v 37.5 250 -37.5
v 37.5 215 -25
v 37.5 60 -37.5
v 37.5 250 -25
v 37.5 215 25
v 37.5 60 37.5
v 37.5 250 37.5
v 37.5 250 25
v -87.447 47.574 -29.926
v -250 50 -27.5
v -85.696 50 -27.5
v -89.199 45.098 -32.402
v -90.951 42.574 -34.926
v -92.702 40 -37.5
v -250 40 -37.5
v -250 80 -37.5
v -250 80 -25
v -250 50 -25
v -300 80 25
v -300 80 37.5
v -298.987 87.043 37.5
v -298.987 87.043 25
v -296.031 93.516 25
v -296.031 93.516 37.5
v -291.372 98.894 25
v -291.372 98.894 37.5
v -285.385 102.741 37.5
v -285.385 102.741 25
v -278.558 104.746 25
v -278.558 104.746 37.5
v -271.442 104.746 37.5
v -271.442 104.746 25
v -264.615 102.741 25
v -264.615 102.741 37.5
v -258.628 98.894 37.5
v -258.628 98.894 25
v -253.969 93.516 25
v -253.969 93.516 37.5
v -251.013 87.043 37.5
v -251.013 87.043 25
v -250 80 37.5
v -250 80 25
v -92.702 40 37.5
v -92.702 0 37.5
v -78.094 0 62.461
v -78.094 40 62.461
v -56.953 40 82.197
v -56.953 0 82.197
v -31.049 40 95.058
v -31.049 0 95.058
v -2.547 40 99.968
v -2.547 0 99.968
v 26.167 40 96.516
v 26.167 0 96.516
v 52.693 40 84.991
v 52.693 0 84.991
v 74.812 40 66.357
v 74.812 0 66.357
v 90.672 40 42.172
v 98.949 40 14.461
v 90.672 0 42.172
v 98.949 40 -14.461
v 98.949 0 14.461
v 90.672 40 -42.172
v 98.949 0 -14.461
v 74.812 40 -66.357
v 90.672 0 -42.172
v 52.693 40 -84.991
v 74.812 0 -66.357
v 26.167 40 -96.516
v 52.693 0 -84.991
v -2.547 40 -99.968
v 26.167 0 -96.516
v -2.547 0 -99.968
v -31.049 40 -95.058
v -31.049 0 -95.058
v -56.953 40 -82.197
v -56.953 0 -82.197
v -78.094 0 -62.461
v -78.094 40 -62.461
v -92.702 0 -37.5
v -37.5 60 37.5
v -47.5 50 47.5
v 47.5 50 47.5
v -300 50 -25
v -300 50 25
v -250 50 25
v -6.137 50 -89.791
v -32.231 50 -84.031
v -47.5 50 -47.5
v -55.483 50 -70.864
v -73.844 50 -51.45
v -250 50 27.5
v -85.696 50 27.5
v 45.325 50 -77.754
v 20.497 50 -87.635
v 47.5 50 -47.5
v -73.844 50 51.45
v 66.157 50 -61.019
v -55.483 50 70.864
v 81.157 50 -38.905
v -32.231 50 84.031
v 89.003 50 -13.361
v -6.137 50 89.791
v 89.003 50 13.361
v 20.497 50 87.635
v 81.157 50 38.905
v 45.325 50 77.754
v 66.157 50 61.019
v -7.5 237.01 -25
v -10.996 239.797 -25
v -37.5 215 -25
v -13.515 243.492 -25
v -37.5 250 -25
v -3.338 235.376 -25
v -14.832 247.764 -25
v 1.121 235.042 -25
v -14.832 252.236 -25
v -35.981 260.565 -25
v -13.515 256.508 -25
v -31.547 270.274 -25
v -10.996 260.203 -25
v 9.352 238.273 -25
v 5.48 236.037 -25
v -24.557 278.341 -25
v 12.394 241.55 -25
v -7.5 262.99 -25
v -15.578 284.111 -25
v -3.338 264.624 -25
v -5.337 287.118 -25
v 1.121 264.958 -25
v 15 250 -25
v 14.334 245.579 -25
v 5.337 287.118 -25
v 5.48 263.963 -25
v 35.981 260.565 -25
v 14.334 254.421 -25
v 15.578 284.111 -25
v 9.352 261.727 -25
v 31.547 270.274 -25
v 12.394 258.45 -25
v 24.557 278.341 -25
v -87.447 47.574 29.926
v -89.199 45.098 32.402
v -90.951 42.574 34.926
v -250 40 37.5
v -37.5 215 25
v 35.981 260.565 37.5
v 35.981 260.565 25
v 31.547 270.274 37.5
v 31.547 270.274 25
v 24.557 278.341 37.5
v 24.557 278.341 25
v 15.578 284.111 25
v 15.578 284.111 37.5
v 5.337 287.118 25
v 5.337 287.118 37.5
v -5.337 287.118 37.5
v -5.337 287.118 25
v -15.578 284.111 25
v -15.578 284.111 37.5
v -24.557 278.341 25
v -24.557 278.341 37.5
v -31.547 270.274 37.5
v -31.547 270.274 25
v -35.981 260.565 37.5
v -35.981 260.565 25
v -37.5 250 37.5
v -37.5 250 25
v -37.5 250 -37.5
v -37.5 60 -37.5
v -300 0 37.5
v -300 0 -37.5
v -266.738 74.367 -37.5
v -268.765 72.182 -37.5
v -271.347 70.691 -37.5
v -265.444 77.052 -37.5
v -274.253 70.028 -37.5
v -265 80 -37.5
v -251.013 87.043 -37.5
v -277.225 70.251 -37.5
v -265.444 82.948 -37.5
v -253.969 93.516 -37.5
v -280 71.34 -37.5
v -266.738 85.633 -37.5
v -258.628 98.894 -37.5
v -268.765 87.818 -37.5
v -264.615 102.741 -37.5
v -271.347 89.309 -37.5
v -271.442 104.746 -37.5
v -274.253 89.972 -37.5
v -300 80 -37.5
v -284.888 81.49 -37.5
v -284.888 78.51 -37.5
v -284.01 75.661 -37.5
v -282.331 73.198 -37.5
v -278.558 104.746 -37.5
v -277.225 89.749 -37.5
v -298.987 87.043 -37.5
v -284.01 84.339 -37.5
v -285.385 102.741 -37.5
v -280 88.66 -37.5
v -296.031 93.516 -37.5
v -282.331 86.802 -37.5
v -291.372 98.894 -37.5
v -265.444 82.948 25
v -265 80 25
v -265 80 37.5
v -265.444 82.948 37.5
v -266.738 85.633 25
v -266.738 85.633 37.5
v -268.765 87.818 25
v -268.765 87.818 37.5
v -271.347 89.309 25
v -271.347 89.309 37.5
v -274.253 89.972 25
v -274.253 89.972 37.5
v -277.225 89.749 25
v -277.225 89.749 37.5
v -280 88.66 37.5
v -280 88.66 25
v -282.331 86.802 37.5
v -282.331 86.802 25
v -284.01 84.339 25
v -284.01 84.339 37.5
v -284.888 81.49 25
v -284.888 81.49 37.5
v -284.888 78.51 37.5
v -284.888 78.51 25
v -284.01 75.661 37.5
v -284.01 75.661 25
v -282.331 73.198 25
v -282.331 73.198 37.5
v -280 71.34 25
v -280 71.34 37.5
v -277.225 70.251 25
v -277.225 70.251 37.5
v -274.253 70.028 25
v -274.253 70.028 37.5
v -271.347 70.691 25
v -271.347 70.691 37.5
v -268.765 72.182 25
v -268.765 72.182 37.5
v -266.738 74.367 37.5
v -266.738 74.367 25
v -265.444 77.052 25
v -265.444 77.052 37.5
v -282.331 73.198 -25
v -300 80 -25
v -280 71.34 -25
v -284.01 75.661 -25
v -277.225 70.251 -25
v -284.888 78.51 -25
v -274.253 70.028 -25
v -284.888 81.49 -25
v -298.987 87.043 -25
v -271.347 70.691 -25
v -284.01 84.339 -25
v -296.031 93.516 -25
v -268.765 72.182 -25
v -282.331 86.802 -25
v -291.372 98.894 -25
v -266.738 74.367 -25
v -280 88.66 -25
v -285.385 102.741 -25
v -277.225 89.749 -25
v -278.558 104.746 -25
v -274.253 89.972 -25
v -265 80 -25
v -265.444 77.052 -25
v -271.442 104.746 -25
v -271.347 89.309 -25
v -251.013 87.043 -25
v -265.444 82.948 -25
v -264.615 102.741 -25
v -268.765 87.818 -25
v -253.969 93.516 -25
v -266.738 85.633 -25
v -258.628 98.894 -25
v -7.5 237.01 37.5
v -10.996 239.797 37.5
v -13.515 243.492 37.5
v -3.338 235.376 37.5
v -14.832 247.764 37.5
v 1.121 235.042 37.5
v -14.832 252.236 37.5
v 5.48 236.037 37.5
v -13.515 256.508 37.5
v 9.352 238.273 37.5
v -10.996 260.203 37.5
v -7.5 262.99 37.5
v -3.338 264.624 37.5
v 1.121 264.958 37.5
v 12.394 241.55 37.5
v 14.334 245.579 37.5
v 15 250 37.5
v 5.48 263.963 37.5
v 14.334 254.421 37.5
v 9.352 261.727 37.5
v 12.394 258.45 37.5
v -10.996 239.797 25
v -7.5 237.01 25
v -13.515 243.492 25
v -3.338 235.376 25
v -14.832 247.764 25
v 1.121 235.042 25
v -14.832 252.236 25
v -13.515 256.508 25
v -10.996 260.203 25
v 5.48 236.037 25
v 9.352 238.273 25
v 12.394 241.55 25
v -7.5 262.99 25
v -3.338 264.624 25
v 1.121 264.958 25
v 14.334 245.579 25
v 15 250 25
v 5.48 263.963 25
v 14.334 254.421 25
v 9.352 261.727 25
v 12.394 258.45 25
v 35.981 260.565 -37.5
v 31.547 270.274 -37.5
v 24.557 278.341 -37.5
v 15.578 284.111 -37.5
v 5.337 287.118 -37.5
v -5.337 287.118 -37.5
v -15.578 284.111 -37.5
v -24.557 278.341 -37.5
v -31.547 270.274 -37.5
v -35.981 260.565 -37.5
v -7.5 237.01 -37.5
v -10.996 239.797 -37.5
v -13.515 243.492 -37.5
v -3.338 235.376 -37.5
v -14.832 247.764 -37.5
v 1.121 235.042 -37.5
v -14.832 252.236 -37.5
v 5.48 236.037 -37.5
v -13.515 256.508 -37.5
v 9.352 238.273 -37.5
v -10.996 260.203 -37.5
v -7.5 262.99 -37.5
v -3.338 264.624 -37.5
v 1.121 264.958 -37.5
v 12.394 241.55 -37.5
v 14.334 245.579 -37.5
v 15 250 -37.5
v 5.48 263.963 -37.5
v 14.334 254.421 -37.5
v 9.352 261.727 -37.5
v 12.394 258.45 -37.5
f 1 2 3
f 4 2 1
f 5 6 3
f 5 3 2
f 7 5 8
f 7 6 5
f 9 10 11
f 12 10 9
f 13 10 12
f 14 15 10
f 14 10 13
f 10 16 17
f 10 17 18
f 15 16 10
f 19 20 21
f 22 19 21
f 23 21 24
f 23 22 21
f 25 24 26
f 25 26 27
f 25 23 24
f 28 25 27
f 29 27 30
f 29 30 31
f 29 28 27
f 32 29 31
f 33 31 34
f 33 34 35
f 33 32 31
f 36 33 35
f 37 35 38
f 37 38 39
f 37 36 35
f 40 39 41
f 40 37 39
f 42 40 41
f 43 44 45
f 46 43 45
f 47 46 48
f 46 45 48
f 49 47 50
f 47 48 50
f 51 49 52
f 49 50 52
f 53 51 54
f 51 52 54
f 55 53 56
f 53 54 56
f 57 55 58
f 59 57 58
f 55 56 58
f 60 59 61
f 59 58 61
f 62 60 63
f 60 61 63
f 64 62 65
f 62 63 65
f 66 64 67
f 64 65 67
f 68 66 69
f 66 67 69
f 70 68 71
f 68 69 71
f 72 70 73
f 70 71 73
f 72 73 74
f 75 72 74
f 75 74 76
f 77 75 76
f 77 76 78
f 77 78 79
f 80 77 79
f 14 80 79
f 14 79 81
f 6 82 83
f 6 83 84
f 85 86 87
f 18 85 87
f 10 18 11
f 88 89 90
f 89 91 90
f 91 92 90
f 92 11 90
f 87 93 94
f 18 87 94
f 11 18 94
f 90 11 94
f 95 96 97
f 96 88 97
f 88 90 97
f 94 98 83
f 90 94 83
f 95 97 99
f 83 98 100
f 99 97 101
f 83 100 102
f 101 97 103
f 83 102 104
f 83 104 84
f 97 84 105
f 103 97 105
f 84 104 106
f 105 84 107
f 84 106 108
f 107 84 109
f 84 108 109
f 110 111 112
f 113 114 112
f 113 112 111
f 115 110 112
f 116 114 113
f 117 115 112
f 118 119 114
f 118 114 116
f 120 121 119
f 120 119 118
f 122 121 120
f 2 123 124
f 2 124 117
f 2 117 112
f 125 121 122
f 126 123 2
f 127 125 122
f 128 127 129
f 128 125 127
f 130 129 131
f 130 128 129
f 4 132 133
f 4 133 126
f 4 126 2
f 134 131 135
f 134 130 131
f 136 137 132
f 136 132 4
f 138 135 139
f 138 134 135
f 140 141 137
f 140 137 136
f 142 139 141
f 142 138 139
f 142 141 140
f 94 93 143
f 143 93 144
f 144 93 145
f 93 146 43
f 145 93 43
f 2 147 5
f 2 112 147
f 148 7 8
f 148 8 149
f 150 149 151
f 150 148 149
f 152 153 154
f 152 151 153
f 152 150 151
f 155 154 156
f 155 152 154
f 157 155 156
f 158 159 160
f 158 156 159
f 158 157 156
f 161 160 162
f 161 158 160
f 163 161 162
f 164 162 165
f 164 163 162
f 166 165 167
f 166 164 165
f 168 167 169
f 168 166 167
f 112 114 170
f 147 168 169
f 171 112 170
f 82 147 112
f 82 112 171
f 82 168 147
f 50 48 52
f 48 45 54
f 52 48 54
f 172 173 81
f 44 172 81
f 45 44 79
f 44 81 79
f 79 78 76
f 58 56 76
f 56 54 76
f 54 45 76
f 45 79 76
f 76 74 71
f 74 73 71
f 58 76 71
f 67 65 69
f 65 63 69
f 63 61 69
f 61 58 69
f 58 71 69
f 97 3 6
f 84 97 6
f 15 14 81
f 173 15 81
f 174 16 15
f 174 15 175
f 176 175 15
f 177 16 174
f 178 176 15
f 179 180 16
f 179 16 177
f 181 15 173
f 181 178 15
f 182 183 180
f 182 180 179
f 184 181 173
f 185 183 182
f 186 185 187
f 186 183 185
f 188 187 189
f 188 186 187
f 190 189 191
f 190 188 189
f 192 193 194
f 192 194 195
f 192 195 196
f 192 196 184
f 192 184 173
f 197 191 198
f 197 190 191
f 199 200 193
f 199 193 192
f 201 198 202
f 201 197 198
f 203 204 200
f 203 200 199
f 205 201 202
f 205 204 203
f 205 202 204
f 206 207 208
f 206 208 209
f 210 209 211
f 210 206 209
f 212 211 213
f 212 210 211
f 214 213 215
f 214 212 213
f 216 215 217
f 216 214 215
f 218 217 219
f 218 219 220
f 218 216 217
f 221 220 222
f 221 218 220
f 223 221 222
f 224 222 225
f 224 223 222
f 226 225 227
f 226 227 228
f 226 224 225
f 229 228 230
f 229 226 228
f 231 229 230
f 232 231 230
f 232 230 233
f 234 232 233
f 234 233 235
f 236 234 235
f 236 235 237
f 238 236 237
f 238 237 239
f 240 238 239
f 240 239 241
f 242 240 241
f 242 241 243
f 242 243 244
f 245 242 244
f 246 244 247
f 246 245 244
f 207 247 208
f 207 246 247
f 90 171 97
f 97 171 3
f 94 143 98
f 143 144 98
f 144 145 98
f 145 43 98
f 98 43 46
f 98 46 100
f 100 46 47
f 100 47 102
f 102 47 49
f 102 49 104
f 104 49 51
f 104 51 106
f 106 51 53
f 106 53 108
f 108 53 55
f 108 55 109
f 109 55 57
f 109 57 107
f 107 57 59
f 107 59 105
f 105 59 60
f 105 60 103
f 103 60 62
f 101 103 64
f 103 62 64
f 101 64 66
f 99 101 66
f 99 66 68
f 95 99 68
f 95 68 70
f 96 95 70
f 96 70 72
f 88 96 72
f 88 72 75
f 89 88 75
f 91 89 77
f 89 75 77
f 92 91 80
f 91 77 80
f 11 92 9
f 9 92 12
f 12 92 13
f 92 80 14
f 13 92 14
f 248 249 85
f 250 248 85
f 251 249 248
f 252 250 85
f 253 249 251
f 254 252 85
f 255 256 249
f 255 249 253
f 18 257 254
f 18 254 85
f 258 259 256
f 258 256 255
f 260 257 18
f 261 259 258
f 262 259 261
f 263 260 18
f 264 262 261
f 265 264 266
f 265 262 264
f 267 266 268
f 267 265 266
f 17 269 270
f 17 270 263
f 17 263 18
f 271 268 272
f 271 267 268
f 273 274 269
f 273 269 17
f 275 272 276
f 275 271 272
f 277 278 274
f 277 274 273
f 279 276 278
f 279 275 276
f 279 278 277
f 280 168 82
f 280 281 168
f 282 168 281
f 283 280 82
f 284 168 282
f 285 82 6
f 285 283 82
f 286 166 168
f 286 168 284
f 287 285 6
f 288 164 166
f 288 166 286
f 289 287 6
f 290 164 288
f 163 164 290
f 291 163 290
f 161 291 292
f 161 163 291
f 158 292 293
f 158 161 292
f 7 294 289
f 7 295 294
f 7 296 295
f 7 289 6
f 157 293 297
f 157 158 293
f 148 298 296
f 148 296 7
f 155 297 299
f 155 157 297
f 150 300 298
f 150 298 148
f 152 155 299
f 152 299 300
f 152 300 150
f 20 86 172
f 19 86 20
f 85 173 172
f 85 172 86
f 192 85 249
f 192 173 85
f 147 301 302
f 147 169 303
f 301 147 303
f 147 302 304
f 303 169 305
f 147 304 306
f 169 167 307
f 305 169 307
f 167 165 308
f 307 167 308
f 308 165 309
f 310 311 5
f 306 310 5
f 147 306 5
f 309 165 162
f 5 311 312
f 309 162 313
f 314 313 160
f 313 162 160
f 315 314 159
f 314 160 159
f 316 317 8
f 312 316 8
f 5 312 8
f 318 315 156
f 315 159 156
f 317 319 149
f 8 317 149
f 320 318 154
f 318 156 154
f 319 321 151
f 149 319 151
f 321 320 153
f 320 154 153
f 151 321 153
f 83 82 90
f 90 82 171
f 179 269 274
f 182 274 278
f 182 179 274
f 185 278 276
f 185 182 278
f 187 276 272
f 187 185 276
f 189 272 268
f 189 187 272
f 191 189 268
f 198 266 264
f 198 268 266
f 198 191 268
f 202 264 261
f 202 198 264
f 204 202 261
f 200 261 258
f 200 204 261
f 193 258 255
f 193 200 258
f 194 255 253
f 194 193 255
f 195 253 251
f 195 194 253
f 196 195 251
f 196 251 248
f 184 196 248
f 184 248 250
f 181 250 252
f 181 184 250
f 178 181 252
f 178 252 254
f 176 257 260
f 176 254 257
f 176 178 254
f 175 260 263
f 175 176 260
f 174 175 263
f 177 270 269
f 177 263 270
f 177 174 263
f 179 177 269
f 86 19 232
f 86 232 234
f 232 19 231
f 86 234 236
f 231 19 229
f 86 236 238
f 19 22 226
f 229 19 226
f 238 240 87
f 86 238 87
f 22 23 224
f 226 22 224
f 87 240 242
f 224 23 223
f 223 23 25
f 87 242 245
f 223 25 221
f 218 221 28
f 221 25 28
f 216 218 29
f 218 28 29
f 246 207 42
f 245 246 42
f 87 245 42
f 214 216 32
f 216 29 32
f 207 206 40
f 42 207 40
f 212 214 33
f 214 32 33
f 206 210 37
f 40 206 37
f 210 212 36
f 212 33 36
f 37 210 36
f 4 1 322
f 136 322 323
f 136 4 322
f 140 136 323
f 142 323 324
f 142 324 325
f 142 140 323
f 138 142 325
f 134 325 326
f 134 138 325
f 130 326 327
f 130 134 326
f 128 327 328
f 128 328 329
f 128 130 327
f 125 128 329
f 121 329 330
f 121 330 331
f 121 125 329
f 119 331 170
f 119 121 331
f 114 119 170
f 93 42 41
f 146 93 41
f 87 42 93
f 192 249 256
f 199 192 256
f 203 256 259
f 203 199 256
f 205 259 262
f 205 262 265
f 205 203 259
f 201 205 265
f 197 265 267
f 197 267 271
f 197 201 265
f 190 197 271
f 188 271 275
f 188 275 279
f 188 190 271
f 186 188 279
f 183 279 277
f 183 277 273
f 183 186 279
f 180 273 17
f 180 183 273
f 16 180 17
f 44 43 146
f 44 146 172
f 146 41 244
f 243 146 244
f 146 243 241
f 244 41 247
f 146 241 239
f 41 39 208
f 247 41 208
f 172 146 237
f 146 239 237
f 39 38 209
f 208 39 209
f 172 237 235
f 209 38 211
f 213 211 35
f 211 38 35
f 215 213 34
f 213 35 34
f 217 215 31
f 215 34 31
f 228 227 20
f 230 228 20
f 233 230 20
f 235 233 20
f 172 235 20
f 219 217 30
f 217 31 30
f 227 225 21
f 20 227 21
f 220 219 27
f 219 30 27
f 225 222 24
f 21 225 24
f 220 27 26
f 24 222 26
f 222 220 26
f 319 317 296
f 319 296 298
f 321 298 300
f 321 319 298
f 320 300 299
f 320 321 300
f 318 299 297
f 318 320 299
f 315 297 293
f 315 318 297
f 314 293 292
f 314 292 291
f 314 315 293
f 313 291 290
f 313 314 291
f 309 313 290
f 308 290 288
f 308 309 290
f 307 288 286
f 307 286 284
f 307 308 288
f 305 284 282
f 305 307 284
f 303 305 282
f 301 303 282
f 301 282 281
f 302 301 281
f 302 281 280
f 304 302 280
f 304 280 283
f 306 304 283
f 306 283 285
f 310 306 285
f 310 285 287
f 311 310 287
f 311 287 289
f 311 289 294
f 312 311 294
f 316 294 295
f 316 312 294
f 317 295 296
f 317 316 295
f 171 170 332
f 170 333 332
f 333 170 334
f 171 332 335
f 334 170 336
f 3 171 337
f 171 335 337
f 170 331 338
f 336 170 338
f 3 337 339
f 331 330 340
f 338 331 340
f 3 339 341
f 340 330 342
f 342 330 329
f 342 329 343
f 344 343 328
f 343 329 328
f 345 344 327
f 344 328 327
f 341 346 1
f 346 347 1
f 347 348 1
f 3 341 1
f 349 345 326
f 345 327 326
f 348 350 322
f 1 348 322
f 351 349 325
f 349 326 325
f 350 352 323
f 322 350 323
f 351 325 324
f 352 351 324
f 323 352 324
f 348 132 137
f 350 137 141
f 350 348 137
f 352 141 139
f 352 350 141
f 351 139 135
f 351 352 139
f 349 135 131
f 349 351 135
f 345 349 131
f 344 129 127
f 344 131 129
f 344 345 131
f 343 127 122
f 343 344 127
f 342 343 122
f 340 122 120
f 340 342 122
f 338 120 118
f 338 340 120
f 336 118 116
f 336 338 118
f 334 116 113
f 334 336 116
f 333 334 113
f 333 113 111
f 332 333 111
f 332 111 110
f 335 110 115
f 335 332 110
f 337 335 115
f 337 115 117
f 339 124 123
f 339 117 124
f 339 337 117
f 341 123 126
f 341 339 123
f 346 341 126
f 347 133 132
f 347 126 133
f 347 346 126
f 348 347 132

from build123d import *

# Parameters (mm, degrees)
SKETCH1_R           = 100
BOSS_EXTRUDE1_DEPTH = 50
SKETCH2_W           = 300
SKETCH2_H           = 75
BOSS_EXTRUDE2_DEPTH = 50
SKETCH3_R           = 10
SKETCH3_R_2         = 15
BOSS_EXTRUDE3_DEPTH = 37.5
SKETCH4_W           = 75
SKETCH4_H           = 72.5
SKETCH4_W_2         = 50
SKETCH4_H_2         = 55
CUT_EXTRUDE2_DEPTH  = 25
CHAMFER1_SIZE       = 10
CHAMFER2_SIZE       = 10


with BuildPart() as part:
    # Sketch1 → Boss-Extrude1 (new body)
    with BuildSketch(Plane(origin=(0, 0, 0), x_dir=(1, 0, 0), z_dir=(0, 1, 0))):
        with Locations(Location((0, 0, 0), (0, 0, 270))):
            Circle(SKETCH1_R)
    extrude(amount=BOSS_EXTRUDE1_DEPTH)

    # Sketch2 → Boss-Extrude2 (add)
    with BuildSketch(Plane(origin=(0, 50, 0), x_dir=(1, 0, 0), z_dir=(0, 1, 0))):
        with Locations((-150, 0)):
            Rectangle(SKETCH2_W, SKETCH2_H)
    extrude(amount=-BOSS_EXTRUDE2_DEPTH)

    # Sketch3 → Boss-Extrude3 (add, symmetric)
    # profile 1 of 2: a face of its own
    with BuildSketch(Plane.XY):
        with BuildLine():
            Line((-300, 50), (-300, 80))
            ThreePointArc((-300, 80), (-275, 105), (-250, 80))
            Line((-250, 80), (-250, 50))
            Line((-250, 50), (-300, 50))
        make_face()
        with Locations((-275, 80)):
            Circle(SKETCH3_R, mode=Mode.SUBTRACT)
    # profile 2 of 2: a face of its own
    with BuildSketch(Plane.XY):
        with BuildLine():
            Line((-37.5, 50), (37.5, 50))
            Line((37.5, 50), (37.5, 250))
            ThreePointArc((37.5, 250), (0, 287.5), (-37.5, 250))
            Line((-37.5, 250), (-37.5, 50))
        make_face()
        with Locations((0, 250)):
            Circle(SKETCH3_R_2, mode=Mode.SUBTRACT)
    extrude(amount=BOSS_EXTRUDE3_DEPTH, both=True)

    # Sketch4 → Cut-Extrude2 (cut, symmetric)
    with BuildSketch(Plane.XY):
        with Locations((0, 251.25)):
            Rectangle(SKETCH4_W, SKETCH4_H)
        with Locations((-275, 77.5)):
            Rectangle(SKETCH4_W_2, SKETCH4_H_2)
    extrude(amount=CUT_EXTRUDE2_DEPTH, both=True, mode=Mode.SUBTRACT)

    # Chamfer1
    chamfer1_edges = [part.edges().sort_by_distance(p)[0] for p in [
        (-171.351240544, 50, -37.5),
        (100, 50, 0),
        (-171.351240544, 50, 37.5),
    ]]
    chamfer(chamfer1_edges, length=CHAMFER1_SIZE)

    # Chamfer2
    chamfer2_edges = [part.edges().sort_by_distance(p)[0] for p in [
        (0, 50, 37.5),
        (0, 50, -37.5),
        (-37.5, 50, 0),
        (37.5, 50, 0),
    ]]
    chamfer(chamfer2_edges, length=CHAMFER2_SIZE)


solid = part.part
